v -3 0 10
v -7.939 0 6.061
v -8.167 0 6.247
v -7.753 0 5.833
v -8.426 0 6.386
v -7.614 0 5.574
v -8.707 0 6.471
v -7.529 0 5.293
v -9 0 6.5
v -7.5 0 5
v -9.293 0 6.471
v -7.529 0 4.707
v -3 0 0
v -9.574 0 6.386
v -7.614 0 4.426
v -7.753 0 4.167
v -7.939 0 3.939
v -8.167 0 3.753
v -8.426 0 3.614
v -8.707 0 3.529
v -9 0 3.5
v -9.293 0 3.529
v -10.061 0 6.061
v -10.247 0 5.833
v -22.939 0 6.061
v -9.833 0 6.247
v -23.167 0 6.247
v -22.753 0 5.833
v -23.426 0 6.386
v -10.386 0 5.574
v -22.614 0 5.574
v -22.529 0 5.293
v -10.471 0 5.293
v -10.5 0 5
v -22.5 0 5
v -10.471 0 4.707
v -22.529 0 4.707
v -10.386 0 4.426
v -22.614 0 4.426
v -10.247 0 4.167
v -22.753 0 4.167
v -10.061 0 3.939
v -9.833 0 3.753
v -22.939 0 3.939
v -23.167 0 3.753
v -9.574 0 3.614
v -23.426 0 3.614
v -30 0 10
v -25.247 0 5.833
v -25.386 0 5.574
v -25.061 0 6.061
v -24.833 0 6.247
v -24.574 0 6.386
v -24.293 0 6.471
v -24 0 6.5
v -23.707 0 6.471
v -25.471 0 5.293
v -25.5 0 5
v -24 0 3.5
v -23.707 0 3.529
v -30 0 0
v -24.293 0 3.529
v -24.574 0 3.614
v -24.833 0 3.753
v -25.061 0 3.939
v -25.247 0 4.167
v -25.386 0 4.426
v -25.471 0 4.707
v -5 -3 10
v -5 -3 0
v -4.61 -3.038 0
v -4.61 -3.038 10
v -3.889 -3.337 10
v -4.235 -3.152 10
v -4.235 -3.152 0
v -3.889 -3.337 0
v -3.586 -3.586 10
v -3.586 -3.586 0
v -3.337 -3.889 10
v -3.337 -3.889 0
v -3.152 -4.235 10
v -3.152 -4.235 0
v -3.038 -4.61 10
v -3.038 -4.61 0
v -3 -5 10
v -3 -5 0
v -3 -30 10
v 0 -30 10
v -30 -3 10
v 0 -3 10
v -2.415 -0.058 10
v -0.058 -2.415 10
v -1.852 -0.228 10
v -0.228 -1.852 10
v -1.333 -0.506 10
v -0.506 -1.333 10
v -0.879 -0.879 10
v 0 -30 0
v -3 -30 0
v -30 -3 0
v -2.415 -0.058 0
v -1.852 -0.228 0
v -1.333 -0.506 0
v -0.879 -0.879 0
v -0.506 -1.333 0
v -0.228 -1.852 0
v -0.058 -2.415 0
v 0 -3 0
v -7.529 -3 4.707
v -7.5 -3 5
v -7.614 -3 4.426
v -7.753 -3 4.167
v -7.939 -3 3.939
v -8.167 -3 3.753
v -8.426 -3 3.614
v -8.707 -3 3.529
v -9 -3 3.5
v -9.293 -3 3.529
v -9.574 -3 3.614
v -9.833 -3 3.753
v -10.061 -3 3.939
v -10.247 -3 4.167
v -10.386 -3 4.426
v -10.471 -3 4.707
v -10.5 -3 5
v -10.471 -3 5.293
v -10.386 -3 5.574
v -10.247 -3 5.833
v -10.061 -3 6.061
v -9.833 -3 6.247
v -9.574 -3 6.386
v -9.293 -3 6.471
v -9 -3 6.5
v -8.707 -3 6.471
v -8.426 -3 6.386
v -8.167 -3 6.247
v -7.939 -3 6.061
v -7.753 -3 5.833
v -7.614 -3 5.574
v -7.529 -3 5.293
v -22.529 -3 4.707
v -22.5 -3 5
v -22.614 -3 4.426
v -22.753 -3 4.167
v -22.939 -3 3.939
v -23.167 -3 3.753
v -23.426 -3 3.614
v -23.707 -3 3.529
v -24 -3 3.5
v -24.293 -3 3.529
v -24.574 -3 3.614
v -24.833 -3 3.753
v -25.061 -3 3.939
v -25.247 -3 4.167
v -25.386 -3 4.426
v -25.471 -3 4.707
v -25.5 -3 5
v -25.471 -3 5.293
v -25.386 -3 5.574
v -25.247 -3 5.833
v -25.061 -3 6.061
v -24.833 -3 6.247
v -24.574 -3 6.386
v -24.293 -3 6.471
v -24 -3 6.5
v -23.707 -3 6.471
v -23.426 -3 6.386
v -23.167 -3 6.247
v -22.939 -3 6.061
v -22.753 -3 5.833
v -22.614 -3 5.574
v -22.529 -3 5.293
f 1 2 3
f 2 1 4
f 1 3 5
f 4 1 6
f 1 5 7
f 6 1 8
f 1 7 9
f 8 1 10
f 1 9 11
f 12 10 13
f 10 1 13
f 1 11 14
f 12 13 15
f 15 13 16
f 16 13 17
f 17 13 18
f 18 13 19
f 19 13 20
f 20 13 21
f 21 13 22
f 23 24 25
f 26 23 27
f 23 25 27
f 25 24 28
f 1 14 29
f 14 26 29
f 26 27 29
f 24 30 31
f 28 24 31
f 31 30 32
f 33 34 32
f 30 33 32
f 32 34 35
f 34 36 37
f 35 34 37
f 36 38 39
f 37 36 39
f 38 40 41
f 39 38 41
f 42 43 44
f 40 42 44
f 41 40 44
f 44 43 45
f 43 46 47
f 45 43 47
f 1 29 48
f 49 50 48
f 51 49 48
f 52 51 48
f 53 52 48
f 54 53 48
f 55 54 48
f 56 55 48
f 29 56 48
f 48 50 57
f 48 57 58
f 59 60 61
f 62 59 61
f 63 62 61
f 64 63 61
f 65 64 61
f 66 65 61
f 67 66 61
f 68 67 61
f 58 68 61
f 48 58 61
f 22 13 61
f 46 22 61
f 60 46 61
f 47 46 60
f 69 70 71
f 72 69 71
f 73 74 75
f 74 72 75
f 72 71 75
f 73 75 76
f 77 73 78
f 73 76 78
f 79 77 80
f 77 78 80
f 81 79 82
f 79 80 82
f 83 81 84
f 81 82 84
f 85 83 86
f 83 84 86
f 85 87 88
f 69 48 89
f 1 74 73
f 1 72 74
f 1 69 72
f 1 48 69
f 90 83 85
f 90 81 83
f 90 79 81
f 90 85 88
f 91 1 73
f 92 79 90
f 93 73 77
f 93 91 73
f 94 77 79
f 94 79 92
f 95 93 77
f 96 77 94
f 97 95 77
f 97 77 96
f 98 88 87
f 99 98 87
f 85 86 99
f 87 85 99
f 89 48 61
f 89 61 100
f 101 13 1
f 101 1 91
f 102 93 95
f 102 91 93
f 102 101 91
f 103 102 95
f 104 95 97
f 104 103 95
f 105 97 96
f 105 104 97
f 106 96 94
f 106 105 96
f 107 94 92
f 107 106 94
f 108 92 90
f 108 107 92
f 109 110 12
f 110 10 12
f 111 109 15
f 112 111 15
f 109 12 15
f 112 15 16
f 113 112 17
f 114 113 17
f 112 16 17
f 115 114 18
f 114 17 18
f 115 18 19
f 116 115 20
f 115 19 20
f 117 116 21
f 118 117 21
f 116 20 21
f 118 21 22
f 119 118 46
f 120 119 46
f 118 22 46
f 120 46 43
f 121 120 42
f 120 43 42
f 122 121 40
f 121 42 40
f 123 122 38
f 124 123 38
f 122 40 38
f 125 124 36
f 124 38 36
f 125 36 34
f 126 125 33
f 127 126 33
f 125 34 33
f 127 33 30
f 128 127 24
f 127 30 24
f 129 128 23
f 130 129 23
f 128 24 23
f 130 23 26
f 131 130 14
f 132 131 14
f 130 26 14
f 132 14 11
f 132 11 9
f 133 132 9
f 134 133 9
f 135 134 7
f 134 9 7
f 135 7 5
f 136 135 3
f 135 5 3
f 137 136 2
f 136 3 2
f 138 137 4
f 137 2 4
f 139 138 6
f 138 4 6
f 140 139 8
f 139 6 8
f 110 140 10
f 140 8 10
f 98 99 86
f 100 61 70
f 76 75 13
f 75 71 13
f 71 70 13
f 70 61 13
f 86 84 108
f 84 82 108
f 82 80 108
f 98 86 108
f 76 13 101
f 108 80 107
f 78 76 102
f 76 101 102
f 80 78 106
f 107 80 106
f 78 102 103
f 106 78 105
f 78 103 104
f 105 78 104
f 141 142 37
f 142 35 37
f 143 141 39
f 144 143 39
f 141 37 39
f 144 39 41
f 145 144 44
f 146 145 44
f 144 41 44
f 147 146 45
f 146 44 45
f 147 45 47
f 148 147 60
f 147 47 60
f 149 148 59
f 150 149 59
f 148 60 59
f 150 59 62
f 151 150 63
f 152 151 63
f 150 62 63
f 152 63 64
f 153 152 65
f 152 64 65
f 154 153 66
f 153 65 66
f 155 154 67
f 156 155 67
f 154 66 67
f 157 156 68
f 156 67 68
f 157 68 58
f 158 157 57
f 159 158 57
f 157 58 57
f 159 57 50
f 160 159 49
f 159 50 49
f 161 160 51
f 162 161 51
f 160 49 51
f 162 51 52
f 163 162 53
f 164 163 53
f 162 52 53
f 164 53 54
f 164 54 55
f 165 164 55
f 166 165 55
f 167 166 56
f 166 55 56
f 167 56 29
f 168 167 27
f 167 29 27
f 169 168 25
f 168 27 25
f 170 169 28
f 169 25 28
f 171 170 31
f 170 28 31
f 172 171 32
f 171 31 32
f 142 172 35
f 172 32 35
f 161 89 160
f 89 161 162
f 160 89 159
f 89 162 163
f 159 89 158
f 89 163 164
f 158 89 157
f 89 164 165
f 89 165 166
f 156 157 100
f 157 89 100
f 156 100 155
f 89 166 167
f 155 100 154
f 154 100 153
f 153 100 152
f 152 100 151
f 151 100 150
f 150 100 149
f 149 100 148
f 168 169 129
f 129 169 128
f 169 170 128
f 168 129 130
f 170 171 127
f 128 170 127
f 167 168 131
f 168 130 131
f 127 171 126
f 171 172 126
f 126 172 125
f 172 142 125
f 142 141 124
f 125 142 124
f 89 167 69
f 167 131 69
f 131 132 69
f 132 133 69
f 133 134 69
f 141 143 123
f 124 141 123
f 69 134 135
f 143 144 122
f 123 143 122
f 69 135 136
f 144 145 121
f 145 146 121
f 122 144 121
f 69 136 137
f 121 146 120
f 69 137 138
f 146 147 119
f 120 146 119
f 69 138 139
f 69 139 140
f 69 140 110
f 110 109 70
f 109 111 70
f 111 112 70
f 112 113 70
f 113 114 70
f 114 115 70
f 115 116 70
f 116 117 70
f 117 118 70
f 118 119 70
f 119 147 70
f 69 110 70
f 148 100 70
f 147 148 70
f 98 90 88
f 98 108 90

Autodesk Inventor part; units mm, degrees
ref_plane "YZ Plane" through (0, 0, 0) normal (1, 0, 0) x (0, 1, 0)
ref_plane "XZ Plane" through (0, 0, 0) normal (0, 1, 0) x (-1, 0, 0)
ref_plane "XY Plane" through (0, 0, 0) normal (0, 0, 1) x (1, 0, 0)
sketch "Sketch1" plane through (0, 0, 0) normal (0, 0, 1) x (1, 0, 0)
  line L0 (0, -3) -> (0, -30)
  line L1 (0, -30) -> (-3, -30)
  line L2 (-3, 0) -> (-30, 0)
  line L3 (-30, 0) -> (-30, -3)
  line L4 (-30, -3) -> (-5, -3)
  line L5 (-3, -5) -> (-3, -30)
  arc A0 (-3, -5) -> (-5, -3) centre (-5, -5) ccw
  arc A1 (0, -3) -> (-3, 0) centre (-3, -3) ccw
  point P0 (0, 0)
  dimension "d0" = 3
  dimension "d1" = 30
  dimension "d2" = 30
  dimension "d3" = 3
  dimension "d4" = 2
  dimension "d5" = 3
extrude "Extrusion1" add sketch "Sketch1" along normal blind 10
sketch "Sketch2" plane through (-30, 0, 0) normal (0, 1, 0) x (1, 0, 0)
  line L0 (0, 0) -> (0, -10) projected
  line L1 (0, -5) -> (105.7615, -5) construction
  circle A0 centre (6, -5) radius 1.5
  circle A1 centre (21, -5) radius 1.5
  point P0 (30, 0)
  dimension "d8" = 3
  dimension "d9" = 3
  dimension "d10" = 6
  dimension "d11" = 15
extrude "Extrusion2" cut sketch "Sketch2" against normal blind 3
equation "\"d2\" = d1"
equation "\"d3\" = d0"
equation "\"d9\" = d8"
properties part number "profiletto a l"
